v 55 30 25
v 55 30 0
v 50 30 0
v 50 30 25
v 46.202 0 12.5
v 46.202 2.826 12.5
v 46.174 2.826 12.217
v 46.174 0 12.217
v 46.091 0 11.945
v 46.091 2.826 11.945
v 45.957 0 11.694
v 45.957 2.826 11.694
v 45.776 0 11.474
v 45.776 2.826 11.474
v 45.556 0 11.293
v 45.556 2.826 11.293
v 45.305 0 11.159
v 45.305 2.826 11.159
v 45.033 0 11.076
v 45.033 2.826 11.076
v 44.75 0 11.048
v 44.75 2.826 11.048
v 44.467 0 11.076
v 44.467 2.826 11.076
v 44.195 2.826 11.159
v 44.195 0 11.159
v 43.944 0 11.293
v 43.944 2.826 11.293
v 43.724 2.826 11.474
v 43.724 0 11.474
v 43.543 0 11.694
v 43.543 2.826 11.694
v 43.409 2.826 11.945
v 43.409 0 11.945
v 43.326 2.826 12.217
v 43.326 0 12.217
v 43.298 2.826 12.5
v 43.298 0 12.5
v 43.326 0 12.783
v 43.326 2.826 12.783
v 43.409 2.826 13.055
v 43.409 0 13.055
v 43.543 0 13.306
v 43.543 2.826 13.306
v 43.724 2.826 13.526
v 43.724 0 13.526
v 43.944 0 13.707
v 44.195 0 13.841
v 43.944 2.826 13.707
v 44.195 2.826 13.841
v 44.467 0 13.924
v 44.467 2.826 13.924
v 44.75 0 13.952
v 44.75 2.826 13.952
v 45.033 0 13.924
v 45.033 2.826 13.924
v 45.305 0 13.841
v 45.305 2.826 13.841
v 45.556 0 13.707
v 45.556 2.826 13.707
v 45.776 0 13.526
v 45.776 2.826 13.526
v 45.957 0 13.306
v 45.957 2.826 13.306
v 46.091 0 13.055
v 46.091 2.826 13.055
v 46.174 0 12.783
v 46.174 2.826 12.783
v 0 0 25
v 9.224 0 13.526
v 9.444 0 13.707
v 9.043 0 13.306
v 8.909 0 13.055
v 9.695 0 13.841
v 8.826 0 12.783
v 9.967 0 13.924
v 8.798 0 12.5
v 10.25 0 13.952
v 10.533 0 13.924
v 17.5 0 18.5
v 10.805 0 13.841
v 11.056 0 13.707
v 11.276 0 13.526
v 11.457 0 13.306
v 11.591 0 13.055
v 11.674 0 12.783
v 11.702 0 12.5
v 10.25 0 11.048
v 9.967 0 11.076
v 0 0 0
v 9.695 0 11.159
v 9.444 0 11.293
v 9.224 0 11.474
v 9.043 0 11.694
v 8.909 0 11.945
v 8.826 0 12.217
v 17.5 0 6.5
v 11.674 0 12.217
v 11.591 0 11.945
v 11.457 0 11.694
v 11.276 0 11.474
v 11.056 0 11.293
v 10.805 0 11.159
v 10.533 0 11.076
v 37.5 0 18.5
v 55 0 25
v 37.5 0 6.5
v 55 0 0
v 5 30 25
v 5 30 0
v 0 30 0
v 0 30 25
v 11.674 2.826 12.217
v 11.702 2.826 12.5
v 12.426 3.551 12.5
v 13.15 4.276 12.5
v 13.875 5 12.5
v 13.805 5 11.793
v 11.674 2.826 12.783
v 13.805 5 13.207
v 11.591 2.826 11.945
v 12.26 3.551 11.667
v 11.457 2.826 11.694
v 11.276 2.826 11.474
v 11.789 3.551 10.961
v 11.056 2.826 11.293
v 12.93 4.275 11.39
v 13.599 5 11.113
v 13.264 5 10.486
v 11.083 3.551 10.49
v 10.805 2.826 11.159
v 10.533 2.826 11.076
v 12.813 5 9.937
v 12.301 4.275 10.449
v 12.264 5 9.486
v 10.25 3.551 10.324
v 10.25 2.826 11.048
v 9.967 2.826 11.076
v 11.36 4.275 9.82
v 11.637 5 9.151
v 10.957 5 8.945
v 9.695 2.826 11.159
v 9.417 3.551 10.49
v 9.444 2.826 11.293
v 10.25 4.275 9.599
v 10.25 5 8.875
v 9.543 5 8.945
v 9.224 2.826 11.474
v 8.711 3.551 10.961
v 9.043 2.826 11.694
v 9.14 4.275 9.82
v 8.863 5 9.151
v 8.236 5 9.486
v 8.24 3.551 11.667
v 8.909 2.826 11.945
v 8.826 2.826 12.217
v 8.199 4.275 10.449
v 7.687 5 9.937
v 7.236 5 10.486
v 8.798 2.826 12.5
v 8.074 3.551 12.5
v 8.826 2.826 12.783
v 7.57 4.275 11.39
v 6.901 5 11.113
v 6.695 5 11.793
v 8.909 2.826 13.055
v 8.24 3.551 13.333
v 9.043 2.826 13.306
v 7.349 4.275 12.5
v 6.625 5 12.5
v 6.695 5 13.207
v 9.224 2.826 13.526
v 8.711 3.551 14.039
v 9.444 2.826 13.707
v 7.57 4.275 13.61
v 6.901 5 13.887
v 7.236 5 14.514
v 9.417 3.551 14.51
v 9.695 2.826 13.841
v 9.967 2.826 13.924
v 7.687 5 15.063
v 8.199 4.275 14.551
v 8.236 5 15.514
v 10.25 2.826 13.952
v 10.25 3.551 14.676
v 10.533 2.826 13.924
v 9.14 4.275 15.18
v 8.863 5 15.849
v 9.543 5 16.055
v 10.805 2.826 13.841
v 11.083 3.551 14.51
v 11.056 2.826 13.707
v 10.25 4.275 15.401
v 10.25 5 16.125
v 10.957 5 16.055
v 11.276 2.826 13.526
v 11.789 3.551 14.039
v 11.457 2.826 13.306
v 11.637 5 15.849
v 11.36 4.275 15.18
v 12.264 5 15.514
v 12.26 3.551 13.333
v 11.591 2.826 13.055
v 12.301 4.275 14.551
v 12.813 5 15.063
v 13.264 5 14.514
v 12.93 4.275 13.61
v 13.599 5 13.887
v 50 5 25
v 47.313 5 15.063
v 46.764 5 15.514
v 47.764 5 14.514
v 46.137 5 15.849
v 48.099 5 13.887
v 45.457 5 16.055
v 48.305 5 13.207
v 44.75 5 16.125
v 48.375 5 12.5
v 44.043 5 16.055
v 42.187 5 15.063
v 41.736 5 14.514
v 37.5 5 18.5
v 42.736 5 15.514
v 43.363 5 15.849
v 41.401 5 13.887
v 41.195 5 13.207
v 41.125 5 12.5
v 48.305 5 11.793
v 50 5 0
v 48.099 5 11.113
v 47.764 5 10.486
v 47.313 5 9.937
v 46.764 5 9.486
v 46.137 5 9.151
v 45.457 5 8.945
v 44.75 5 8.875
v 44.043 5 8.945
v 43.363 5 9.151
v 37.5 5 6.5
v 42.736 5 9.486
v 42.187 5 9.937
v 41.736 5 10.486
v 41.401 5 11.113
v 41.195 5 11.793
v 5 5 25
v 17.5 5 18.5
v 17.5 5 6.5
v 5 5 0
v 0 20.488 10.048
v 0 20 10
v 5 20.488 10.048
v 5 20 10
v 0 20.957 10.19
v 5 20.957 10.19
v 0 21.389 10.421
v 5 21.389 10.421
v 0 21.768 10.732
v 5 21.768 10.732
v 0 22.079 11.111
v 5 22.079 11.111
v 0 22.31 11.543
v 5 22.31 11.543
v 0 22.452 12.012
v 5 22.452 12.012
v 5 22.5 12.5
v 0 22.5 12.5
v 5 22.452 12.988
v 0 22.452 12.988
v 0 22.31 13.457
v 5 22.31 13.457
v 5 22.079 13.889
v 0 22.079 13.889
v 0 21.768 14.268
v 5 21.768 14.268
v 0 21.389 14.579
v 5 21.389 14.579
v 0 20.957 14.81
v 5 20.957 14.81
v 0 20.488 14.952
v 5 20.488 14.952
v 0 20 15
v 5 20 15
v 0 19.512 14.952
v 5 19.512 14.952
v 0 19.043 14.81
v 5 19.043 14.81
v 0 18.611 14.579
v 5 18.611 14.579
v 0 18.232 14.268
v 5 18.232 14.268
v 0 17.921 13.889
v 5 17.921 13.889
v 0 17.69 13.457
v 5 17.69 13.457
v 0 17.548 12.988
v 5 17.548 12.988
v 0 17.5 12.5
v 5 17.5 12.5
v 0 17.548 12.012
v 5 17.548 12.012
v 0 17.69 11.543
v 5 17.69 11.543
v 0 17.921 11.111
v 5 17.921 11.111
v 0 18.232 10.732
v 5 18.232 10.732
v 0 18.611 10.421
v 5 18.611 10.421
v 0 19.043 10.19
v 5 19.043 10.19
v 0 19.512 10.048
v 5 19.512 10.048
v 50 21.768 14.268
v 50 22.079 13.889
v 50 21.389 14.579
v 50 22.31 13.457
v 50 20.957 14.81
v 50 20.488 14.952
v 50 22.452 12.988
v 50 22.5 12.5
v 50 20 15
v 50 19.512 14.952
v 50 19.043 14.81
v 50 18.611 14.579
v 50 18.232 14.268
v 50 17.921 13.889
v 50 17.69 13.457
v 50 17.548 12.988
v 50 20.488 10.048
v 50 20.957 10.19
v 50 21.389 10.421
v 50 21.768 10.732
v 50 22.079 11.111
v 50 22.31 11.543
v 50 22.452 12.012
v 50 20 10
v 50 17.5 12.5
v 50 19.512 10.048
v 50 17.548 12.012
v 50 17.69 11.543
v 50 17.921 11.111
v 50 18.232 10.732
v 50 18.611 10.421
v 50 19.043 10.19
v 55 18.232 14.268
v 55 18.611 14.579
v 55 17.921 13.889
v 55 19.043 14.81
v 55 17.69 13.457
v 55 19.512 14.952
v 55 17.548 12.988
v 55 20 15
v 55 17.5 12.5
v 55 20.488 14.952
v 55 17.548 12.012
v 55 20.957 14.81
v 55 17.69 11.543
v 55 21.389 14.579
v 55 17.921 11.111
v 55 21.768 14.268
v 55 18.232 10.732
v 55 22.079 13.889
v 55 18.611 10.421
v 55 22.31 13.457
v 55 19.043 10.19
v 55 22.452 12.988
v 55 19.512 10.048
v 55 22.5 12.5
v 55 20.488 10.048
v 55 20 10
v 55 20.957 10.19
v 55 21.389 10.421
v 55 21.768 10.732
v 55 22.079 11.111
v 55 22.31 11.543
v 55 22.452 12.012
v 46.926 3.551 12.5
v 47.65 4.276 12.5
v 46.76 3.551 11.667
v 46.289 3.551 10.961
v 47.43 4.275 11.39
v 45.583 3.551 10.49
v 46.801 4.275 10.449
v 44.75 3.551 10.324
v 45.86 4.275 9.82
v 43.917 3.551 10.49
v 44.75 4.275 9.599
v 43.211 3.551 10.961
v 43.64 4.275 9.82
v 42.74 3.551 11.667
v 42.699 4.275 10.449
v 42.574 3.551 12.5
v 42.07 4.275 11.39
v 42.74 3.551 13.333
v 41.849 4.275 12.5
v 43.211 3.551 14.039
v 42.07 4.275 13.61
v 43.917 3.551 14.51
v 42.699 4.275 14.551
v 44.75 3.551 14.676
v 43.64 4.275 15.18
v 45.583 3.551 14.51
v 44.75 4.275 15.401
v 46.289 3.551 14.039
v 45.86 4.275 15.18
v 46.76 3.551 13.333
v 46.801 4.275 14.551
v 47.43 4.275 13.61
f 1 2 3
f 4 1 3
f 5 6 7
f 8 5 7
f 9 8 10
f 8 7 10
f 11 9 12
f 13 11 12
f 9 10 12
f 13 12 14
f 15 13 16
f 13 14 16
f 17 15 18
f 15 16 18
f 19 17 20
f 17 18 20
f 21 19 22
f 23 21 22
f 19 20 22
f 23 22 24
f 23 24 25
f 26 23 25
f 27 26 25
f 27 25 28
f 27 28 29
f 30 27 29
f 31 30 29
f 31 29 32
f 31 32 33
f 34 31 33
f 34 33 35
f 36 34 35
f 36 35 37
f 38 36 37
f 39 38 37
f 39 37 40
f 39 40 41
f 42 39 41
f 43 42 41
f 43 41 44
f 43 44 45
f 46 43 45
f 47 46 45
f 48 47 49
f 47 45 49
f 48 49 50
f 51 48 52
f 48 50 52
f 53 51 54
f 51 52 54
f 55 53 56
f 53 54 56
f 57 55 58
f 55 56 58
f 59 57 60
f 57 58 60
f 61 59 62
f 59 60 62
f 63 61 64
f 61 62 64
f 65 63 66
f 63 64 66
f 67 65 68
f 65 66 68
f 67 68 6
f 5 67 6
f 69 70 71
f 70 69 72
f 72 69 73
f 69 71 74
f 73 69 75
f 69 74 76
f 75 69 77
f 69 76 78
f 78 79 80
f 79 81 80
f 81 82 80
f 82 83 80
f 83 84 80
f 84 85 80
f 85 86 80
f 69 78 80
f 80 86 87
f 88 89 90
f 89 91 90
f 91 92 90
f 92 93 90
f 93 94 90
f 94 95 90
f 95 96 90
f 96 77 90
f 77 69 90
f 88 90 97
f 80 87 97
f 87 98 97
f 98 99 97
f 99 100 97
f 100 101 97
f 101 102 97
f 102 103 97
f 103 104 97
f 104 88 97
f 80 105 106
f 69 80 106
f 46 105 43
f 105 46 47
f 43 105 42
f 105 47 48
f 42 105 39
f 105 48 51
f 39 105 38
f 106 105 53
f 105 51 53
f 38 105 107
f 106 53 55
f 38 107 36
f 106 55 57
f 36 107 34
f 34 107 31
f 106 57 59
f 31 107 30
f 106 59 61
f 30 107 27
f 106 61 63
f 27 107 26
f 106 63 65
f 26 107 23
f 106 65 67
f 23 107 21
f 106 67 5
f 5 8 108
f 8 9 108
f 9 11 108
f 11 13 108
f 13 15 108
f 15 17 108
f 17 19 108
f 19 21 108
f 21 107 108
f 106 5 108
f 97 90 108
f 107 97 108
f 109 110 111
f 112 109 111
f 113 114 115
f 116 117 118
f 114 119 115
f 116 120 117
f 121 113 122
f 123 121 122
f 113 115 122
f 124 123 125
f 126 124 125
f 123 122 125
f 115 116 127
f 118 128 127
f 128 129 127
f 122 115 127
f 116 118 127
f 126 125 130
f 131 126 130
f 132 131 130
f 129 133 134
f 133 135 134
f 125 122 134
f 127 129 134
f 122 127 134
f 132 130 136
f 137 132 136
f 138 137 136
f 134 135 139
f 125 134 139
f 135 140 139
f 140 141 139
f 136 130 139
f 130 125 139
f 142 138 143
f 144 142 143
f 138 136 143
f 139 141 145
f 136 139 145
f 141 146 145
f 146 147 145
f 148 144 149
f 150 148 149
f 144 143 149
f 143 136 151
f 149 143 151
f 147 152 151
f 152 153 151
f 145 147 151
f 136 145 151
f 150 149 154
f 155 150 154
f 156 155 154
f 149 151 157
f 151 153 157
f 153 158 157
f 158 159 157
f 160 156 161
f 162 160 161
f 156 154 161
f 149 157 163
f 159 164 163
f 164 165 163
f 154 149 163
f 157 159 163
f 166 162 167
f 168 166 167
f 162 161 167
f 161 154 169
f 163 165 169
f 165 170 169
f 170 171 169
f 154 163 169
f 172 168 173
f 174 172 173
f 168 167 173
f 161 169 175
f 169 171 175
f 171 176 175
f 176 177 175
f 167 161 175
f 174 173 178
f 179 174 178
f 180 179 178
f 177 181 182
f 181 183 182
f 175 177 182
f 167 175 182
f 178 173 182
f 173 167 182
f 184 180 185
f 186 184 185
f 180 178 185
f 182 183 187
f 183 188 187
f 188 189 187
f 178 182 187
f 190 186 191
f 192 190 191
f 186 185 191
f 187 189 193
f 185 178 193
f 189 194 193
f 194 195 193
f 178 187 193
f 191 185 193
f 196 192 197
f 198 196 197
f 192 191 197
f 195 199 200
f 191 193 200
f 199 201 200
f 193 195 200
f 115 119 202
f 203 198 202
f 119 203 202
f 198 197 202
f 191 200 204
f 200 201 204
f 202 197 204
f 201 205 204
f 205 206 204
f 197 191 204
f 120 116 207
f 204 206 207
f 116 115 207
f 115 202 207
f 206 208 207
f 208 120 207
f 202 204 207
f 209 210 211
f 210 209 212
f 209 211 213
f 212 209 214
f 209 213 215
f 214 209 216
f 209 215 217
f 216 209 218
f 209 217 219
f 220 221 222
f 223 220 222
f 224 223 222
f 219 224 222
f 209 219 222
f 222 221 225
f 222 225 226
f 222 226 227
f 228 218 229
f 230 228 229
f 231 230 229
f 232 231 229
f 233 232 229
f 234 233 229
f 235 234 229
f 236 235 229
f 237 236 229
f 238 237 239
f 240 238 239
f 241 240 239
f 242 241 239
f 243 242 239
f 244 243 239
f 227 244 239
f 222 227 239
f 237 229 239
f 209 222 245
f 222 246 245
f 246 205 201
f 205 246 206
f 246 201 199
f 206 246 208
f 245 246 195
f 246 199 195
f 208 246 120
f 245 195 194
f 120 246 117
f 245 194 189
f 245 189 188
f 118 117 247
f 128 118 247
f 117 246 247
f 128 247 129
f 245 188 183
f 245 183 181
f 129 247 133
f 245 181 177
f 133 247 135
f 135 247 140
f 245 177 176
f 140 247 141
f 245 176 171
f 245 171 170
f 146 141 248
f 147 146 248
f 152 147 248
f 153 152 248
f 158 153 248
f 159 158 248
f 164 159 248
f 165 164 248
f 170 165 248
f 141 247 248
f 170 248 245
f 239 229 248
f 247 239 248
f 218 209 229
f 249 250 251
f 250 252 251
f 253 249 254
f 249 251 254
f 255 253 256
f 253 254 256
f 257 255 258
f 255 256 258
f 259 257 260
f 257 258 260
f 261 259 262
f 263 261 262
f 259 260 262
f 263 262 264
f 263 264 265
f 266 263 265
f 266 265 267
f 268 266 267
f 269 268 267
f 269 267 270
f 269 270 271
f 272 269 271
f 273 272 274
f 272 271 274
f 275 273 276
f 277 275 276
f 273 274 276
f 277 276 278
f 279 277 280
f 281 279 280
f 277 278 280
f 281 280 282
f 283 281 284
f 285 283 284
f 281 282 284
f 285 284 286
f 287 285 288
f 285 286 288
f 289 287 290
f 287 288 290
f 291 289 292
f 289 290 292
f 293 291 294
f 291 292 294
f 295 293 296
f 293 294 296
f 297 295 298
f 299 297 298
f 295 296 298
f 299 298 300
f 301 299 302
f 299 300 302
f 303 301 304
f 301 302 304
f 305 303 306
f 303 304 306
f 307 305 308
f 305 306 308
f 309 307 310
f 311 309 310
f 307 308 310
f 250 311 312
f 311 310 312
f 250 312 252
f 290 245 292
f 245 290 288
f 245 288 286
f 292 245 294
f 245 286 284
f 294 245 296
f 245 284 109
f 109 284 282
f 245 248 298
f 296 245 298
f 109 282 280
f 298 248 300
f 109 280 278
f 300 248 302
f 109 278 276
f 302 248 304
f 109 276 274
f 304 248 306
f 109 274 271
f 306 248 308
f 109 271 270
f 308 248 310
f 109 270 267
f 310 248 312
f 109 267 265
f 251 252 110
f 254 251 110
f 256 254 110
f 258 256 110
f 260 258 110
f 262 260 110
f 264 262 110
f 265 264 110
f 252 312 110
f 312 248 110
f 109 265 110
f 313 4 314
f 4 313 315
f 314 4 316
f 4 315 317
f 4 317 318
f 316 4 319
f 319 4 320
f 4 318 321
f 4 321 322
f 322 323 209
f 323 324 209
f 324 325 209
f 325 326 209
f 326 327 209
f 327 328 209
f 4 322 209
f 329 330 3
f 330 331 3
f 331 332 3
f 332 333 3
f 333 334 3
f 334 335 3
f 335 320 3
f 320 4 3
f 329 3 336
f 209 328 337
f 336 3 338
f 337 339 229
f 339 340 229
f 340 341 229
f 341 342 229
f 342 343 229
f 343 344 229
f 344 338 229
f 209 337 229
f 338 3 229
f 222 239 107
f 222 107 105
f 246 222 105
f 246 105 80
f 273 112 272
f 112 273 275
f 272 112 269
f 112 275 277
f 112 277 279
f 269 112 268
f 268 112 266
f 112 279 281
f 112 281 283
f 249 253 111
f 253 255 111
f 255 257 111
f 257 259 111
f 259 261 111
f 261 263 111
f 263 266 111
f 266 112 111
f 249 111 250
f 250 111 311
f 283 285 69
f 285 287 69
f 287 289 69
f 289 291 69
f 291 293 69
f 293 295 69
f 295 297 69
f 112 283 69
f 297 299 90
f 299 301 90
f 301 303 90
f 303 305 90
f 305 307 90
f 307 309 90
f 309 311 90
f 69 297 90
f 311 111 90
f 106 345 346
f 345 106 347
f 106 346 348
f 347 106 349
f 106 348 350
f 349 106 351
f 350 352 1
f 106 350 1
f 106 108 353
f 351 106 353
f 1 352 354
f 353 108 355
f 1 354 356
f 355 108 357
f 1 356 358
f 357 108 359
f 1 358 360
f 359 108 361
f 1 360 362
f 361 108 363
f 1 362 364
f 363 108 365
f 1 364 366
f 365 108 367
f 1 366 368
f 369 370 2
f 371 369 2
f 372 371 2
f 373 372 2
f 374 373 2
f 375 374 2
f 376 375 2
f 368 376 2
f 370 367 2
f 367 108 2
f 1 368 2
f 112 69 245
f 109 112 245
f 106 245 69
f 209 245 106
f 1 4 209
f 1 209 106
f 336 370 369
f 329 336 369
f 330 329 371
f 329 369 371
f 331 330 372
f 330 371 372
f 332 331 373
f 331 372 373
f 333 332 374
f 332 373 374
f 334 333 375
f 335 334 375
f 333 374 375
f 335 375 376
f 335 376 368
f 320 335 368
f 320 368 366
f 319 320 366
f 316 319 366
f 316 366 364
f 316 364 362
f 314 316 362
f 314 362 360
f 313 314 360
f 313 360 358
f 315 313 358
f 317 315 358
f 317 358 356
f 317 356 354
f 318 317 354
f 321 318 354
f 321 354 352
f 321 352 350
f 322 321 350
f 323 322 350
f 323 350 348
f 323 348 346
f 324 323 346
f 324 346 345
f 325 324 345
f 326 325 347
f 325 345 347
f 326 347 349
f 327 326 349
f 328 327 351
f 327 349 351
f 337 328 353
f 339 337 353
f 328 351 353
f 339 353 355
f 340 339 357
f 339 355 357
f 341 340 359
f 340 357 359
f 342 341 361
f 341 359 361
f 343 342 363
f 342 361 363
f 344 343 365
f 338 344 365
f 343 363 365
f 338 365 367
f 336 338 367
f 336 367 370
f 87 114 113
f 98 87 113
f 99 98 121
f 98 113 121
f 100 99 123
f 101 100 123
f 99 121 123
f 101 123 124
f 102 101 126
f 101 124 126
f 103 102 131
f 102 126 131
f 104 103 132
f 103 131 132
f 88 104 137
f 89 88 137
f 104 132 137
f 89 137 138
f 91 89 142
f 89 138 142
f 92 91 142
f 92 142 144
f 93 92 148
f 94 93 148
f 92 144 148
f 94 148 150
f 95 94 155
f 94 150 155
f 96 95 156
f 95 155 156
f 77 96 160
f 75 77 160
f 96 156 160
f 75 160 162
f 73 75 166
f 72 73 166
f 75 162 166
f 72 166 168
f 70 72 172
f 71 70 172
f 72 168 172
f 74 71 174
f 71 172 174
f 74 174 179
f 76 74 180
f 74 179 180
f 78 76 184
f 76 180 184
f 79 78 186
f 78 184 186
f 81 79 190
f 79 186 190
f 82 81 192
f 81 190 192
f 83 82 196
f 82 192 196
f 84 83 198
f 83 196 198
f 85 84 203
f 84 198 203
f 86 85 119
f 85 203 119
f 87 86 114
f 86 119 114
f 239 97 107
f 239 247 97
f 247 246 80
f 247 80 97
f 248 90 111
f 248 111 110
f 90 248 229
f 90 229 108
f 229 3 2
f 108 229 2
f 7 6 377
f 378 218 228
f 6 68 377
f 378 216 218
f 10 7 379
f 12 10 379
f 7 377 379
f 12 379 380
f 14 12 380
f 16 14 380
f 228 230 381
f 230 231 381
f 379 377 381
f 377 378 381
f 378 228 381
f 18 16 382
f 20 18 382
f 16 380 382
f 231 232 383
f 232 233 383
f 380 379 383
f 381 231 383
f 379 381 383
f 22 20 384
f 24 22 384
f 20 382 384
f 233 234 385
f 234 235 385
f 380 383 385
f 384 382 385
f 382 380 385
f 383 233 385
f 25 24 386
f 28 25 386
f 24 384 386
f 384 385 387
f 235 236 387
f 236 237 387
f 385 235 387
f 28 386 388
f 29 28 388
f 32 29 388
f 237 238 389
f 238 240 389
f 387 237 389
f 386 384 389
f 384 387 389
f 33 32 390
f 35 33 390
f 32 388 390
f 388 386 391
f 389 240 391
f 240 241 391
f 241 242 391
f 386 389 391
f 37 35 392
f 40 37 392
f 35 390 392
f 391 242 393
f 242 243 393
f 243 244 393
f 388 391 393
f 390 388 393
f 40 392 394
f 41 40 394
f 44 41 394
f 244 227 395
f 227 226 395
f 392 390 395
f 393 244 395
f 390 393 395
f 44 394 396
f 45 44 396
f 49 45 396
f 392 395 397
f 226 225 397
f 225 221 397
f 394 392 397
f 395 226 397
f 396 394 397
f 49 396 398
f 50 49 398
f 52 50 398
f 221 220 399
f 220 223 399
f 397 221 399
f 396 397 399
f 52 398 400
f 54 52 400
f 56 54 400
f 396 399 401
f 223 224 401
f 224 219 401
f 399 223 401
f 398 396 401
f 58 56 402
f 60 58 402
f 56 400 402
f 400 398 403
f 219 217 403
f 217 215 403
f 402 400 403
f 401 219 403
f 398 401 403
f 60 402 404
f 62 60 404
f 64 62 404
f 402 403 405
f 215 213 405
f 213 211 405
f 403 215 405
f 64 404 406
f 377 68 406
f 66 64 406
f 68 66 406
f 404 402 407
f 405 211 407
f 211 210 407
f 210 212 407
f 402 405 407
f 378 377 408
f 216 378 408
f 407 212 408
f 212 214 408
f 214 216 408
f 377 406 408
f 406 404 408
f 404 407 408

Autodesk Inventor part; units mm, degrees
ref_plane "YZ Plane" through (0, 0, 0) normal (1, 0, 0) x (0, 1, 0)
ref_plane "XZ Plane" through (0, 0, 0) normal (0, 1, 0) x (-1, 0, 0)
ref_plane "XY Plane" through (0, 0, 0) normal (0, 0, 1) x (1, 0, 0)
sketch "Sketch1" plane through (0, 0, 0) normal (0, 0, 1) x (1, 0, 0)
  line L0 (0, 0) -> (55, 0)
  line L1 (55, 0) -> (55, 30)
  line L2 (55, 30) -> (50, 30)
  line L3 (50, 30) -> (50, 5)
  line L4 (50, 5) -> (5, 5)
  line L5 (5, 5) -> (5, 30)
  line L6 (5, 30) -> (0, 30)
  line L7 (0, 30) -> (0, 0)
  dimension "d0" = 55
  dimension "d1" = 30
  dimension "d2" = 5
  dimension "d3" = 25
  dimension "d4" = 45
  dimension "d5" = 25
  dimension "d6" = 5
extrude "Extrusion1" add sketch "Sketch1" along normal blind 25
sketch "Sketch2" plane through (55, 0, 0) normal (1, 0, 0) x (0, 0, -1)
  circle A0 centre (-12.5, 20) radius 2.5
  line L0 (0, 30) -> (-25, 30) projected
  line L1 (0, 0) -> (0, 30) projected
  dimension "d9" = 5
  dimension "d10" = 10
  dimension "d11" = 12.5
extrude "Extrusion2" cut sketch "Sketch2" against normal through all
sketch "Sketch3" plane through (5, 5, 0) normal (0, 1, 0) x (1, 0, 0)
  line L0 (12.5, -6.5) -> (32.5, -6.5)
  line L1 (32.5, -6.5) -> (32.5, -18.5)
  line L2 (32.5, -18.5) -> (12.5, -18.5)
  line L3 (12.5, -18.5) -> (12.5, -6.5)
  line L4 (12.5, -6.5) -> (32.5, -18.5) construction
  line L5 (32.5, -6.5) -> (12.5, -18.5) construction
  line L6 (45, 0) -> (0, 0) projected
  line L7 (0, 0) -> (0, -25) projected
  point P0 (-5, 0)
  point P1 (22.5, -12.5)
  dimension "d14" = 20
  dimension "d15" = 12
  dimension "d16" = 12.5
  dimension "d17" = 22.5
extrude "Extrusion3" cut sketch "Sketch3" against normal through all
sketch "Sketch4" plane through (5, 5, 0) normal (0, 1, 0) x (1, 0, 0)
  circle A0 centre (5.25, -12.5) radius 3.625
  circle A1 centre (39.75, -12.5) radius 3.625
  line L0 (0, -10) -> (0, -15) projected
  line L1 (45, 0) -> (45, -25) projected
  line L2 (45, -25) -> (0, -25) projected
  point P0 (-5, 0)
  dimension "d20" = 7.25
  dimension "d21" = 7.25
  dimension "d22" = 5.25
  dimension "d23" = 5.25
  dimension "d24" = 12.5
  dimension "d25" = 12.5
extrude "Extrusion4" cut sketch "Sketch4" against normal blind 2.1735 draft -45
sketch "Sketch5" plane through (10.25, 2.8265, 12.5) normal (0, 1, 0) x (1, 0, 0)
  circle A0 centre (0, 0) radius 1.4515
  circle A1 centre (34.5, 0) radius 1.4515
  line L0 (39.75, 12.5) -> (39.75, -12.5) projected
  point P0 (-10.25, 12.5)
  dimension "d28" = 2.903
  dimension "d29" = 2.903
  dimension "d30" = 5.25
extrude "Extrusion5" cut sketch "Sketch5" against normal through all
properties part number "2nd to 3rd arm linking clamp"
